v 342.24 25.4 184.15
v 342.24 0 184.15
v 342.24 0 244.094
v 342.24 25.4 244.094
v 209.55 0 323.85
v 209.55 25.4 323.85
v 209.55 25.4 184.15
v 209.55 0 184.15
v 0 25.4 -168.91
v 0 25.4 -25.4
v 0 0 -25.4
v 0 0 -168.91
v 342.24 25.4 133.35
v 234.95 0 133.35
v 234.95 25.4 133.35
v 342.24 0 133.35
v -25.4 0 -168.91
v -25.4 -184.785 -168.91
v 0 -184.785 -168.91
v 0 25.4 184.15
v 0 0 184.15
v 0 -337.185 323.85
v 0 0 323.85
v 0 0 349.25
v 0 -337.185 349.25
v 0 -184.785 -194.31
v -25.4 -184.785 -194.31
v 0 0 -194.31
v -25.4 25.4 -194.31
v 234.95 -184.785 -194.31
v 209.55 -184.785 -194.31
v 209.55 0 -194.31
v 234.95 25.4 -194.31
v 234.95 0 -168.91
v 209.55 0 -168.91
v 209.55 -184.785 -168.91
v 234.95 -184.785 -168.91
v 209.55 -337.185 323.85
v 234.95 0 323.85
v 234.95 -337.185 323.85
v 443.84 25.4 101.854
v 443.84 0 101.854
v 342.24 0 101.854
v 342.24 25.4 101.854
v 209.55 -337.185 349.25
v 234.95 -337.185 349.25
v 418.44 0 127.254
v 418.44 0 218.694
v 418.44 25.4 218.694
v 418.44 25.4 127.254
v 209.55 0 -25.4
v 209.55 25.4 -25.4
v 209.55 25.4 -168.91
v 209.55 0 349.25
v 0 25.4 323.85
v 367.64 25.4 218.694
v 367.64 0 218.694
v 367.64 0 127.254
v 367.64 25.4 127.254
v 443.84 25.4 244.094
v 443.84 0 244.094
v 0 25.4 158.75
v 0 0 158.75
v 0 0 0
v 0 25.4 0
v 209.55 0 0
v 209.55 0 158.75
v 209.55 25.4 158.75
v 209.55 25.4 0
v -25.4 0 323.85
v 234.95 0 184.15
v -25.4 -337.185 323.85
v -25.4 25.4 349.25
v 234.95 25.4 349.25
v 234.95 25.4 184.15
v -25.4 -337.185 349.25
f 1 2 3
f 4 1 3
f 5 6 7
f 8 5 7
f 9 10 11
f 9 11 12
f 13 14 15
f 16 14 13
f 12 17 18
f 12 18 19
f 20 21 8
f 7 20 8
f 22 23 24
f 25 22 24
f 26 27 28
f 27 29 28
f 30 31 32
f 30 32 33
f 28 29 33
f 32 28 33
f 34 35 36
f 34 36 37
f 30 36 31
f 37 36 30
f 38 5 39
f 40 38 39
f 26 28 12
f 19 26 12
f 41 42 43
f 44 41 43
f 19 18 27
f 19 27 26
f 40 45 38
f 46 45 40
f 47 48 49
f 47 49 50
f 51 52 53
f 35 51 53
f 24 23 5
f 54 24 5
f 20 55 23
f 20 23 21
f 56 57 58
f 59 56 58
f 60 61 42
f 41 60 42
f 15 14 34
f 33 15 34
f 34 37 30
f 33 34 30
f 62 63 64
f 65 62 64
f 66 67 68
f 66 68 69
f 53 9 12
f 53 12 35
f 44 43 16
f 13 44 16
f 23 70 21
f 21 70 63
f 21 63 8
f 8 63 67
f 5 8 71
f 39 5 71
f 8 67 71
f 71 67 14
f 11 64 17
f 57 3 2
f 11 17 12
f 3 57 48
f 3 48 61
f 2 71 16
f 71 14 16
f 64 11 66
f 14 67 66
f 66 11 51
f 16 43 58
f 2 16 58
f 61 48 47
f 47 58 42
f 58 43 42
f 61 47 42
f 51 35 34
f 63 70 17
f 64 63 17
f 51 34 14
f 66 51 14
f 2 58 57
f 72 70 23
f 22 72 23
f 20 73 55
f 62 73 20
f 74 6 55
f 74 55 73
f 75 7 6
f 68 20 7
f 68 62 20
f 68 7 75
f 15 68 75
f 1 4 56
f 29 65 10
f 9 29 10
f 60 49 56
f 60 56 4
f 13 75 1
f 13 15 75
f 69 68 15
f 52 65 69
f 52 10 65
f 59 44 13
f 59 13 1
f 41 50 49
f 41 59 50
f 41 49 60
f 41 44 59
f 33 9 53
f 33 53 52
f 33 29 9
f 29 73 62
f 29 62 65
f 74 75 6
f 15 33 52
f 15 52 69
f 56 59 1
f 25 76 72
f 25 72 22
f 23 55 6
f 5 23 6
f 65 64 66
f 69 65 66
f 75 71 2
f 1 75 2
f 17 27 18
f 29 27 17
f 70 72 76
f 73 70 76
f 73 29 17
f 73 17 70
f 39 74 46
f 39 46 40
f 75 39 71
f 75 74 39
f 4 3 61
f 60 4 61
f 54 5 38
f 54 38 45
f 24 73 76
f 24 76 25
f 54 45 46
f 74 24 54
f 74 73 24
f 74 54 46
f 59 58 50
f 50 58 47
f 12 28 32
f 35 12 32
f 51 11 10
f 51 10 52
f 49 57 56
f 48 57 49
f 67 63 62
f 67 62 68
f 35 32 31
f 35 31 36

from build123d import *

# Parameters (mm, degrees)
SKETCH2_W           = 260.35
SKETCH2_H           = 209.55
SKETCH2_W_2         = 209.55
SKETCH2_H_2         = 158.75
SKETCH2_W_3         = 50.8
SKETCH2_H_3         = 91.44
SKETCH2_W_4         = 107.2896
SKETCH2_H_4         = 50.8
BOSS_EXTRUDE1_DEPTH = 25.4
SKETCH3_W           = 260.35
SKETCH3_H           = 543.56
SKETCH3_W_2         = 209.55
SKETCH3_H_2         = 492.76
BOSS_EXTRUDE2_DEPTH = 25.4
SKETCH4_W           = 25.4
SKETCH4_H           = 25.4
BOSS_EXTRUDE3_DEPTH = 184.785
SKETCH5_W           = 25.4
SKETCH5_H           = 25.4
BOSS_EXTRUDE4_DEPTH = 337.185


with BuildPart() as part:
    # Sketch2 → Boss-Extrude1 (new body)
    # profile 1 of 3: a face of its own
    with BuildSketch(Plane(origin=(0, 0, 0), x_dir=(1, 0, 0), z_dir=(0, 1, 0))):
        with Locations((104.775, -79.375)):
            Rectangle(SKETCH2_W, SKETCH2_H)
        with Locations((104.775, -79.375)):
            Rectangle(SKETCH2_W_2, SKETCH2_H_2, mode=Mode.SUBTRACT)
    # profile 2 of 3: a face of its own
    with BuildSketch(Plane(origin=(0, 0, 0), x_dir=(1, 0, 0), z_dir=(0, 1, 0))):
        Polygon((342.2396, -133.35), (342.2396, -184.15), (342.2396, -244.094), (443.8396, -244.094), (443.8396, -101.854), (342.2396, -101.854), align=None)
        with Locations((393.0396, -172.974)):
            Rectangle(SKETCH2_W_3, SKETCH2_H_3, mode=Mode.SUBTRACT)
    # profile 3 of 3: a face of its own
    with BuildSketch(Plane(origin=(0, 0, 0), x_dir=(1, 0, 0), z_dir=(0, 1, 0))):
        with Locations((288.5948, -158.75)):
            Rectangle(SKETCH2_W_4, SKETCH2_H_4)
    extrude(amount=BOSS_EXTRUDE1_DEPTH)

    # Sketch3 → Boss-Extrude2 (add)
    with BuildSketch(Plane(origin=(0, 25.4, 0), x_dir=(1, 0, 0), z_dir=(0, 1, 0))):
        with Locations((104.775, -77.47)):
            Rectangle(SKETCH3_W, SKETCH3_H)
        with Locations((104.775, -77.47)):
            Rectangle(SKETCH3_W_2, SKETCH3_H_2, mode=Mode.SUBTRACT)
    extrude(amount=-BOSS_EXTRUDE2_DEPTH)

    # Sketch4 → Boss-Extrude3 (add)
    with BuildSketch(Plane.XZ):
        with Locations((-12.7, -181.61)):
            Rectangle(SKETCH4_W, SKETCH4_H)
        with Locations((222.25, -181.61)):
            Rectangle(SKETCH4_W, SKETCH4_H)
    extrude(amount=BOSS_EXTRUDE3_DEPTH)

    # Sketch5 → Boss-Extrude4 (add)
    with BuildSketch(Plane.XZ):
        with Locations((-12.7, 336.55)):
            Rectangle(SKETCH5_W, SKETCH5_H)
        with Locations((222.25, 336.55)):
            Rectangle(SKETCH5_W, SKETCH5_H)
    extrude(amount=BOSS_EXTRUDE4_DEPTH)


solid = part.part
